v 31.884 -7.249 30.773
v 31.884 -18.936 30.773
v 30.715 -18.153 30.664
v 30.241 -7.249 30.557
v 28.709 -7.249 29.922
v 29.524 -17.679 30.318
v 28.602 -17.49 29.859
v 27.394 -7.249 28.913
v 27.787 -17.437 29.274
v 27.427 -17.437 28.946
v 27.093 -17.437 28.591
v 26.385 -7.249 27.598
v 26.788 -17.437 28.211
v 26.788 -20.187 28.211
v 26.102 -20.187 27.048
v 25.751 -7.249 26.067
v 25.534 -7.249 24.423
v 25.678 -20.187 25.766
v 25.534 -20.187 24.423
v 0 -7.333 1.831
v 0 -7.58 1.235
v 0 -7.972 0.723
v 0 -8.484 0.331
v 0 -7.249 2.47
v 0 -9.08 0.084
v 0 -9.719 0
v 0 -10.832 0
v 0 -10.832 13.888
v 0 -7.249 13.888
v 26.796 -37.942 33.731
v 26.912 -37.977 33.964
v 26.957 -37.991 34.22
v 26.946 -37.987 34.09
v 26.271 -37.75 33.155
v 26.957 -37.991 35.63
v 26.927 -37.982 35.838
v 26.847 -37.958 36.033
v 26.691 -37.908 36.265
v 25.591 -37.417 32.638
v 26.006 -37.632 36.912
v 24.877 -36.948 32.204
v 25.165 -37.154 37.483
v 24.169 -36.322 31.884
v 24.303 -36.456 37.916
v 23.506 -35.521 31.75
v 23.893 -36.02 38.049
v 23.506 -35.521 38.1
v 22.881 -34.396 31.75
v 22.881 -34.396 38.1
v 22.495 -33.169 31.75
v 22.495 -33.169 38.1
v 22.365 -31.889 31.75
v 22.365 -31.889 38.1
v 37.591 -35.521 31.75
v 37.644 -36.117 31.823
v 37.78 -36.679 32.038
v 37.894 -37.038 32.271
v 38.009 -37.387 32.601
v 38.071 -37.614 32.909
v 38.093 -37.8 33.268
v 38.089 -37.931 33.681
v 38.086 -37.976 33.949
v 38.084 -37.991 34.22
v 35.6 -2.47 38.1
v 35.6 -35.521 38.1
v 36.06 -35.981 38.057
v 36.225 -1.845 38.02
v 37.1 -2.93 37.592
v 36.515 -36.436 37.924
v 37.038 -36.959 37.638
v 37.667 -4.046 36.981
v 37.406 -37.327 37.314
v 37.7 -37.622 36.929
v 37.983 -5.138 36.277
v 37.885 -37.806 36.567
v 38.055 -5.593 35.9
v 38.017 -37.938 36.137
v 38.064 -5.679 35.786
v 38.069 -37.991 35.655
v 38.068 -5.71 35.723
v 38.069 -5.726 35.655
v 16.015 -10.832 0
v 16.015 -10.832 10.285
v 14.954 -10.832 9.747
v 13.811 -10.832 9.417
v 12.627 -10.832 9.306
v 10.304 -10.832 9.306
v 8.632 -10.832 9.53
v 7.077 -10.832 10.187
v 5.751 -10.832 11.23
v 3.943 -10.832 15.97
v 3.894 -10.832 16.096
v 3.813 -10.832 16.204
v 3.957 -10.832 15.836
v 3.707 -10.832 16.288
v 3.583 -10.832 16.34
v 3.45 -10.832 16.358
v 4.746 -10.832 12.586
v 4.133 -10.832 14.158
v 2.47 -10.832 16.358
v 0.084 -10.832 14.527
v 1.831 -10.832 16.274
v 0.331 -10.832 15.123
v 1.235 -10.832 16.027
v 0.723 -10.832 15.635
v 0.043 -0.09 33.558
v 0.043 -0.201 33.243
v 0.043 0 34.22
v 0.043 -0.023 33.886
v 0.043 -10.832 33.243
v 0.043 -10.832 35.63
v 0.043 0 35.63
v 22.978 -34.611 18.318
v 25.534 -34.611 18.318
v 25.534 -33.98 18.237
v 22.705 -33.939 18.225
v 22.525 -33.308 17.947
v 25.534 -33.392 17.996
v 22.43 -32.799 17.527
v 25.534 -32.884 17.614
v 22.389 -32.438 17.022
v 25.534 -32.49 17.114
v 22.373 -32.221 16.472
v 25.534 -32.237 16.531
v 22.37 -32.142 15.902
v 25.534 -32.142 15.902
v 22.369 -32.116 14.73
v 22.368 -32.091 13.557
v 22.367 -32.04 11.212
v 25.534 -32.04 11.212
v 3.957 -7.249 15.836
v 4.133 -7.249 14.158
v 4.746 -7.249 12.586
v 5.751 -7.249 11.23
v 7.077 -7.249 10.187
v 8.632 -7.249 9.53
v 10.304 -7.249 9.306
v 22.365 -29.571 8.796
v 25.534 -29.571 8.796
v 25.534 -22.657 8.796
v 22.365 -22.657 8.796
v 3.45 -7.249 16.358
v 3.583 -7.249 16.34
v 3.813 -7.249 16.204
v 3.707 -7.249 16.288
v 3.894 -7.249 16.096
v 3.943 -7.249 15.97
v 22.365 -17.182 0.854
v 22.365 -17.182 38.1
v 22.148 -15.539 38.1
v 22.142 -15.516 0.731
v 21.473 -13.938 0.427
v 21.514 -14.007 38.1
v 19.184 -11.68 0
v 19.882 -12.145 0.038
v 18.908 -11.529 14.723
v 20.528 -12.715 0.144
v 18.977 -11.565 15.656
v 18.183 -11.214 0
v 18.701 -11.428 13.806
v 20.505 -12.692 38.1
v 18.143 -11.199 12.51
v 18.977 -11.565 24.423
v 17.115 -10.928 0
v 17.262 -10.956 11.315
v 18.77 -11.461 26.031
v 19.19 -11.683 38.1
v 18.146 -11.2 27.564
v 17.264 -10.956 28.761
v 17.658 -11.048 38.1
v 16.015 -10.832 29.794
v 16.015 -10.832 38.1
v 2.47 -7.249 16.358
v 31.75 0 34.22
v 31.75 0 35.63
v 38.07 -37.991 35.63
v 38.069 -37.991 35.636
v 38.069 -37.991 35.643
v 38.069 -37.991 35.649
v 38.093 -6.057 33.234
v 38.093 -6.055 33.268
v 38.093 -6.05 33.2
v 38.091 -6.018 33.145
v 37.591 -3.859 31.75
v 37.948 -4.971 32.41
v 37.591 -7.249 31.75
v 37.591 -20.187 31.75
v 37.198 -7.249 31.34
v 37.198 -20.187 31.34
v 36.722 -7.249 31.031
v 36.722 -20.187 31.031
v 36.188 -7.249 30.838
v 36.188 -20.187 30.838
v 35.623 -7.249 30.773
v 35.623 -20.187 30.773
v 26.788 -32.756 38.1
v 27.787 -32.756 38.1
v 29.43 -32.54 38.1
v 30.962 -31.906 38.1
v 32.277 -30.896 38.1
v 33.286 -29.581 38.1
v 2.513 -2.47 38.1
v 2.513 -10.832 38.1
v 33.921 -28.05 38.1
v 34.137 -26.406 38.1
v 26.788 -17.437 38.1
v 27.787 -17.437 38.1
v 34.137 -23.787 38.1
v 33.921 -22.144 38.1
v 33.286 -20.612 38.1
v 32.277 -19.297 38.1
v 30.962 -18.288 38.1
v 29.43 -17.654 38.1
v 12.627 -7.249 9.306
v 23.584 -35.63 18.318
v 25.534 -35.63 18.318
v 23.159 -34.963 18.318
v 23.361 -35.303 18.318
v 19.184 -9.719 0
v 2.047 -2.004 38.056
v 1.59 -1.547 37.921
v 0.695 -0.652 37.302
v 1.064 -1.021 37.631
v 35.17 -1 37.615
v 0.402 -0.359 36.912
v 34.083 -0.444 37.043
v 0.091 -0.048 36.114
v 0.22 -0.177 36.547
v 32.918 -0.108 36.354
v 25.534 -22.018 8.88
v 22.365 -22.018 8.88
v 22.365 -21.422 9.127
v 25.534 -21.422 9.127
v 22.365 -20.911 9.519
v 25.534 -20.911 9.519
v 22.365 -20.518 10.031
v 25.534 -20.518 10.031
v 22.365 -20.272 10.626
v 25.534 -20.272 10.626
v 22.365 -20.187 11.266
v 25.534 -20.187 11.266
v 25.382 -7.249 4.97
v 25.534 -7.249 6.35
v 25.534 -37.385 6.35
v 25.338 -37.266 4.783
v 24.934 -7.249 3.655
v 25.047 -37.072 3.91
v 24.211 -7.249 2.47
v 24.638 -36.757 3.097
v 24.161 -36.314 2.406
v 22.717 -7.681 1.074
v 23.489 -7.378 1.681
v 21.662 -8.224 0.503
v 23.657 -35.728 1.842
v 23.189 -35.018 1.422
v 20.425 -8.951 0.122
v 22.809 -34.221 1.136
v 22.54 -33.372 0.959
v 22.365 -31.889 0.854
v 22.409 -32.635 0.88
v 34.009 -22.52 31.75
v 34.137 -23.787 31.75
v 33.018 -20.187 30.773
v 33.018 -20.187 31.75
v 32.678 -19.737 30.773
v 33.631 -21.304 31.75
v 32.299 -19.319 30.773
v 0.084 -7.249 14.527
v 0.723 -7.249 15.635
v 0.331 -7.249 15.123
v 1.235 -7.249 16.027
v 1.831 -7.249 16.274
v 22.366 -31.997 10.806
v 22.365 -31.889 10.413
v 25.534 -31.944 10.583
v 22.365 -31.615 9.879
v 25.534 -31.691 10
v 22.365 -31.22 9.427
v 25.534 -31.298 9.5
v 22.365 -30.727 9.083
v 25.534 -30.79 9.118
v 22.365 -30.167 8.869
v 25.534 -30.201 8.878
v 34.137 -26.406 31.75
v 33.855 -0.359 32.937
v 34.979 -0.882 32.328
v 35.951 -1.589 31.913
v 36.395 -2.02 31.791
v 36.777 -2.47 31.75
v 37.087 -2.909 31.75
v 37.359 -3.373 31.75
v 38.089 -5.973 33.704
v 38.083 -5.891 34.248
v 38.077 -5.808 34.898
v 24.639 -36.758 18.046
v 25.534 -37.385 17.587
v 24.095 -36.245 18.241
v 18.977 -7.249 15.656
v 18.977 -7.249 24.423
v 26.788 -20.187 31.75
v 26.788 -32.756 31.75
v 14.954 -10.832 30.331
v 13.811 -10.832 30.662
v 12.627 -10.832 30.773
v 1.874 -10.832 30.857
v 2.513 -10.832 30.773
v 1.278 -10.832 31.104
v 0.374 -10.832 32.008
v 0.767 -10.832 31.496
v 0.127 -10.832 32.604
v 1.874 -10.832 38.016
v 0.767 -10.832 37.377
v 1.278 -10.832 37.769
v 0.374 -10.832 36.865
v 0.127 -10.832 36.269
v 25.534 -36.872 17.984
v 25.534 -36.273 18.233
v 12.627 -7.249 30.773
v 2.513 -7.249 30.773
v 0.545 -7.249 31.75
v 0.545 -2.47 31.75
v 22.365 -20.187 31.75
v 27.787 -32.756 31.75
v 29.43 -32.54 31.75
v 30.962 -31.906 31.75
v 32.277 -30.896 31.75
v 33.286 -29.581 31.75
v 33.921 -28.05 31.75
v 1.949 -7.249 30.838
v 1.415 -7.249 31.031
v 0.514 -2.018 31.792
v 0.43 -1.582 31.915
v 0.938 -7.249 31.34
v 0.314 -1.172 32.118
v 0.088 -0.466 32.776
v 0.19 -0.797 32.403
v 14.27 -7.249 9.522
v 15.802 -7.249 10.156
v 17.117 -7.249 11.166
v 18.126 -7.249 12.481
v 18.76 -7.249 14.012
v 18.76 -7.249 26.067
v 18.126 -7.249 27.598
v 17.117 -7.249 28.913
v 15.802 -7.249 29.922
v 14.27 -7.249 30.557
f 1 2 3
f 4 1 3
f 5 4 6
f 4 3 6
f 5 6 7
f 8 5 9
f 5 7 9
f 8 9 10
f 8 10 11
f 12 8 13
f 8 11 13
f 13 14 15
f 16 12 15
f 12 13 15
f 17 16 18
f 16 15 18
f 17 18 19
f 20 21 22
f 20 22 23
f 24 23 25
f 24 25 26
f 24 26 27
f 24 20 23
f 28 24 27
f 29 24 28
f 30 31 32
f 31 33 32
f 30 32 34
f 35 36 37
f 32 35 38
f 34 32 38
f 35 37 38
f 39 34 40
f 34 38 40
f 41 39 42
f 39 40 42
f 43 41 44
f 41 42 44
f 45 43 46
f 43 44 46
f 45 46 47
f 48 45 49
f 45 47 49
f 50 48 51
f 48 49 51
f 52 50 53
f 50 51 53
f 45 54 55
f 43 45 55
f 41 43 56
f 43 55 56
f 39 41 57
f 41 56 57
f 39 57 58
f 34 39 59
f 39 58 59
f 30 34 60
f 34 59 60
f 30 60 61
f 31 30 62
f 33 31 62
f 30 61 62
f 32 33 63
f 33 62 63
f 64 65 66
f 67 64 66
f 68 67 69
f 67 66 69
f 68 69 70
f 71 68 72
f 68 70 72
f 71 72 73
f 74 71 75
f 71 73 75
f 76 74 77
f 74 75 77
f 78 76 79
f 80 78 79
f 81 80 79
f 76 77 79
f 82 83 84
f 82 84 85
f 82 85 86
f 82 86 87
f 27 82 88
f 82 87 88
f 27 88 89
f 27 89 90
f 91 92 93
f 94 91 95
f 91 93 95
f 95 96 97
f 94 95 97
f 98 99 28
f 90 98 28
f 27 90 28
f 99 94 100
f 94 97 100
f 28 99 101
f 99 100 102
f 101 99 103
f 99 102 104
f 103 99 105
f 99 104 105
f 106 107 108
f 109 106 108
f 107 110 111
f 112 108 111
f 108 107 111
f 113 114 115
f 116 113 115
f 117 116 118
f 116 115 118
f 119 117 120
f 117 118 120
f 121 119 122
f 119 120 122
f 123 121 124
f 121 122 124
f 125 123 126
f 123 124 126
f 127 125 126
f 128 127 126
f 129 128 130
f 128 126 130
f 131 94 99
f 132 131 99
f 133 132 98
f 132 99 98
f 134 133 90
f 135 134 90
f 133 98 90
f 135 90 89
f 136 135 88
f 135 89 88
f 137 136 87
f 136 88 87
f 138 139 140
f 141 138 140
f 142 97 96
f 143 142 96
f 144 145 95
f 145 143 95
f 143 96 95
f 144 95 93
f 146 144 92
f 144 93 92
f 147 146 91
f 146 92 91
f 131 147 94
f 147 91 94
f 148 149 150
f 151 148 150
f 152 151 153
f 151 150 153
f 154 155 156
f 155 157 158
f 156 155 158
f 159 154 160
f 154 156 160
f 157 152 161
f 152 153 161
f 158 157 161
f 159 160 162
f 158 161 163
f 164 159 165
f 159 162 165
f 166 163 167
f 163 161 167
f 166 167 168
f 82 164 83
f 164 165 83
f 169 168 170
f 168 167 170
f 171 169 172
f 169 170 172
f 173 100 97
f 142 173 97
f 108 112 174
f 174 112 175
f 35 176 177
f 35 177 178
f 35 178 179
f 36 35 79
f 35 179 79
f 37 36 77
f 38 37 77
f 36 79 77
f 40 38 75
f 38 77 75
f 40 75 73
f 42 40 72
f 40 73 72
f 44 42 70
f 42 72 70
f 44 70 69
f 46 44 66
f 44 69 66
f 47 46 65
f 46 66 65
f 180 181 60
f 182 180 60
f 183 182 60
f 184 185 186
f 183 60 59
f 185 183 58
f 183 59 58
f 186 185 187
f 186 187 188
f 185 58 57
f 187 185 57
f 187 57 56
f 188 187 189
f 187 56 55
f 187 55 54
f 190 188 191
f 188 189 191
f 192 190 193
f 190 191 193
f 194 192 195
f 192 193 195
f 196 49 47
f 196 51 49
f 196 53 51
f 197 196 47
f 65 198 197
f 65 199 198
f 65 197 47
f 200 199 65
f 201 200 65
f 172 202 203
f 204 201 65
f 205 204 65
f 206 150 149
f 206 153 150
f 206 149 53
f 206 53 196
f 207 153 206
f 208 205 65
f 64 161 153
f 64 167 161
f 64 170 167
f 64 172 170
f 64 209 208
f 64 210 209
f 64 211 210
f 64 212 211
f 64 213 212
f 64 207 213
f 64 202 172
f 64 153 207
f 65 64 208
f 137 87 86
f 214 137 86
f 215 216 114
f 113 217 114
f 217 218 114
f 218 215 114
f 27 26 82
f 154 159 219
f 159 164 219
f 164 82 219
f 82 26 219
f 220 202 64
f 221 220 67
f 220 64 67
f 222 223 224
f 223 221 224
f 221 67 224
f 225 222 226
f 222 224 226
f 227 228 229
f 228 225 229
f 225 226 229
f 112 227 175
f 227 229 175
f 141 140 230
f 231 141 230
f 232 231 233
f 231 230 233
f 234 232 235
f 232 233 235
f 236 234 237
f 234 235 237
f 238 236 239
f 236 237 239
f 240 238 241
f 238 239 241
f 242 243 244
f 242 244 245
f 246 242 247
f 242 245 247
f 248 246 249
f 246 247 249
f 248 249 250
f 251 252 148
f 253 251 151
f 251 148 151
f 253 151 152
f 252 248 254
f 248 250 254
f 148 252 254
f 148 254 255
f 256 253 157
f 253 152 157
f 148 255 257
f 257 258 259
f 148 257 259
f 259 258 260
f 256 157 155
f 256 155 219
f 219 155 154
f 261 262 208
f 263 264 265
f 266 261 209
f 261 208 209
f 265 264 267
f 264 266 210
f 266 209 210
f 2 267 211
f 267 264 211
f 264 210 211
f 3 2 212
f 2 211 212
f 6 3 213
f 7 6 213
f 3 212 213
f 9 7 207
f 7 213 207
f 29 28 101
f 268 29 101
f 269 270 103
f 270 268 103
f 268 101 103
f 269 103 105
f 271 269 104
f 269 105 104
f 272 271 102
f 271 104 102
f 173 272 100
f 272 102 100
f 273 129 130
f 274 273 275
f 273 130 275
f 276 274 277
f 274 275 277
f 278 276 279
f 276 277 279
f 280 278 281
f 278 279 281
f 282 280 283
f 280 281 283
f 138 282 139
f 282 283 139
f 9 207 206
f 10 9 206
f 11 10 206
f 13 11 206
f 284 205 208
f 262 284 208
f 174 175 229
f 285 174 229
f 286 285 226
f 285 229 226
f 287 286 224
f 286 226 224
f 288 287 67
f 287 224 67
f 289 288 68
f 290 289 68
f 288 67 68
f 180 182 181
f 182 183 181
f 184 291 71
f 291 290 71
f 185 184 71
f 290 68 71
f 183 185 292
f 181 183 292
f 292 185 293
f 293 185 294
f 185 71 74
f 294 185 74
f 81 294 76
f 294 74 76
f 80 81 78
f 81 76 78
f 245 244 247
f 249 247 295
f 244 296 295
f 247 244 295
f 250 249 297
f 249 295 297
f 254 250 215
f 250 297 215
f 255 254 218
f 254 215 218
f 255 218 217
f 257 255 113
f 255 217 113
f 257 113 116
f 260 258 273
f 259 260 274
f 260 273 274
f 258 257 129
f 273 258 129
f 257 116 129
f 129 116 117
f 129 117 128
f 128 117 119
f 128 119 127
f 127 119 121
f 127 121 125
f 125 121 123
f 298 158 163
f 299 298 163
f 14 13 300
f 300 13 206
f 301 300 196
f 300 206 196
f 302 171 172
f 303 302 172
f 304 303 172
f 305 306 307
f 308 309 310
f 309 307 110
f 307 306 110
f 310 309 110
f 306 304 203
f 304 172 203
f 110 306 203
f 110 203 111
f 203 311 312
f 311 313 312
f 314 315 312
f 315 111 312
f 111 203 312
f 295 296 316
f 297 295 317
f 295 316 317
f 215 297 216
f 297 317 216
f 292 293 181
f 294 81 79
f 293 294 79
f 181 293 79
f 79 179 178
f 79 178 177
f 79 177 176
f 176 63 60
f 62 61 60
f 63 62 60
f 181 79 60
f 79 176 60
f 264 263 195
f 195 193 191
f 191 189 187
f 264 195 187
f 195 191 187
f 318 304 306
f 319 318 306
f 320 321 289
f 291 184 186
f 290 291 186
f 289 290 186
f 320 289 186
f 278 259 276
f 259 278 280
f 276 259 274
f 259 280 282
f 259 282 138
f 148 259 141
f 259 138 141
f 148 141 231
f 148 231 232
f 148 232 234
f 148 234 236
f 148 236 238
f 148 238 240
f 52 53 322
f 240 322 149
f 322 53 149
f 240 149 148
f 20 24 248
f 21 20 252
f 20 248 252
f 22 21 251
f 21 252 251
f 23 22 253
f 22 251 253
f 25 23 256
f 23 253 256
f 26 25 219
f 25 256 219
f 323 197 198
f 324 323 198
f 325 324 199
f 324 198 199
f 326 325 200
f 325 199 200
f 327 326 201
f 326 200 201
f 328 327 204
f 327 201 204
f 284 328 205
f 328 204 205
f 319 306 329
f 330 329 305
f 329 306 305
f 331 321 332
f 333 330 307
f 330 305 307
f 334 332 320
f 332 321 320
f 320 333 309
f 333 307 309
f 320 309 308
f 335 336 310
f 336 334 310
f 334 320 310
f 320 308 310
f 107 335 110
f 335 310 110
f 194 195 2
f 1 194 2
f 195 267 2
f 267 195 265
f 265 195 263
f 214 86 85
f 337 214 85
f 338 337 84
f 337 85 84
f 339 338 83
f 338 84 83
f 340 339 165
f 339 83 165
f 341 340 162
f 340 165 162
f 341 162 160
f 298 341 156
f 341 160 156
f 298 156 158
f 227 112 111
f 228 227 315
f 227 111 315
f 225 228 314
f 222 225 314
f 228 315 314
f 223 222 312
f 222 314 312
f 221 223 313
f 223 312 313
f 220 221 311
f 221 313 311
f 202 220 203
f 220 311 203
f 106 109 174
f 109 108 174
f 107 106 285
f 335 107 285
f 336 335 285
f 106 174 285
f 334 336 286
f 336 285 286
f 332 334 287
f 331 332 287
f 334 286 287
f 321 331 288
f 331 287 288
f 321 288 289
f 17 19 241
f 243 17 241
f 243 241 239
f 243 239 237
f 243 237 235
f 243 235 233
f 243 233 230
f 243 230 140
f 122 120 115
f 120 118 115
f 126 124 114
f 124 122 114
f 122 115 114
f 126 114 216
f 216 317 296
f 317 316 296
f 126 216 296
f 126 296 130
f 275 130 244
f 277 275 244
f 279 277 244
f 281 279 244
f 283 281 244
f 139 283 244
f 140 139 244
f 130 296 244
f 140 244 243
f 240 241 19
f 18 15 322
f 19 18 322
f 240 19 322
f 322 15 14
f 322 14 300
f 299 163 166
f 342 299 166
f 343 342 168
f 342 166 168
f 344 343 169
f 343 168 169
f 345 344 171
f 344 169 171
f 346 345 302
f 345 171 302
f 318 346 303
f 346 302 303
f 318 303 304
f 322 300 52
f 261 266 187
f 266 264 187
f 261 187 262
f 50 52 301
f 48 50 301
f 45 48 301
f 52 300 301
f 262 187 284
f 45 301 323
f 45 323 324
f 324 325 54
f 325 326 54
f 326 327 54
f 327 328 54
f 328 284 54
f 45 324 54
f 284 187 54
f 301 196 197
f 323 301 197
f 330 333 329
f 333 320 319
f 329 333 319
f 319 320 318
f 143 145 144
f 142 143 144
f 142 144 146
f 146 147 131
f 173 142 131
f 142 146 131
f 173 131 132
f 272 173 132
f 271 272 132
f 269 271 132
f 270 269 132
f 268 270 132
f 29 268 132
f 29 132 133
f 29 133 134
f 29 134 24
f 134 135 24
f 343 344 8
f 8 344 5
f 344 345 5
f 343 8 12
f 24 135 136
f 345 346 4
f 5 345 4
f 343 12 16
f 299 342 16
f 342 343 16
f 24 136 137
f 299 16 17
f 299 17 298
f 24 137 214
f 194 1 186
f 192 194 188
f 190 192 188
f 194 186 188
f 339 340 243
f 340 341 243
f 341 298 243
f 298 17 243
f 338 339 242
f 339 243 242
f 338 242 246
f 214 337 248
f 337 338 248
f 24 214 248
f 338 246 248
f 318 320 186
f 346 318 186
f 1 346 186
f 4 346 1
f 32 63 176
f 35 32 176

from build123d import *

# Parameters (mm, degrees)
F0_W      = 38.1
F0_H      = 38.1
F1_DEPTH  = 38.1
F7_DEPTH  = 38.1
F8_DEPTH  = 38.1
F10_DEPTH = 38.1


with BuildPart() as f1:
    # F0 (on Front) → F1 (new body)
    with BuildSketch(Plane.XZ):
        with Locations((19.05, 19.05)):
            Rectangle(F0_W, F0_H)
    extrude(amount=F1_DEPTH)

    # F6 (on offset) → F7 (cut)
    with BuildSketch(Plane.YZ.offset(38.1)):
        with BuildLine():
            Line((-20.187413, 31.75), (-29.192599, 31.75))
            Line((-29.192599, 31.75), (-35.52093, 31.75))
            ThreePointArc((-35.52093, 31.75), (-37.267369, 32.473399), (-37.990768, 34.219837))
            Line((-37.990768, 34.219837), (-37.990768, 35.630163))
            ThreePointArc((-37.990768, 35.630163), (-37.267369, 37.376601), (-35.52093, 38.1))
            Line((-35.52093, 38.1), (-38.1, 38.1))
            Line((-38.1, 38.1), (-38.1, 15.848642))
            ThreePointArc((-38.1, 15.848642), (-37.376601, 17.595081), (-35.630163, 18.31848))
            Line((-35.630163, 18.31848), (-34.611057, 18.31848))
            ThreePointArc((-34.611057, 18.31848), (-32.883701, 17.613958), (-32.141803, 15.902322))
            Line((-32.141803, 15.902322), (-32.039838, 11.211913))
            ThreePointArc((-32.039838, 11.211913), (-31.29794, 9.500277), (-29.570584, 8.795755))
            Line((-29.570584, 8.795755), (-22.657251, 8.795755))
            ThreePointArc((-22.657251, 8.795755), (-20.910812, 9.519154), (-20.187413, 11.265592))
            Line((-20.187413, 11.265592), (-20.187413, 31.75))
        make_face()
        with BuildLine():
            Line((0, 0), (0, 34.219837))
            ThreePointArc((0, 34.219837), (-0.723399, 32.473399), (-2.469837, 31.75))
            Line((-2.469837, 31.75), (-7.248927, 31.75))
            Line((-7.248927, 31.75), (-7.248927, 2.469837))
            ThreePointArc((-7.248927, 2.469837), (-7.972326, 0.723399), (-9.718765, 0))
            Line((-9.718765, 0), (0, 0))
        make_face()
        with BuildLine():
            Line((0, 38.1), (-2.469837, 38.1))
            ThreePointArc((-2.469837, 38.1), (-0.723399, 37.376601), (0, 35.630163))
            Line((0, 35.630163), (0, 38.1))
        make_face()
        with BuildLine():
            ThreePointArc((-35.630163, 0), (-37.376601, 0.723399), (-38.1, 2.469837))
            Line((-38.1, 2.469837), (-38.1, 0))
            Line((-38.1, 0), (-35.630163, 0))
        make_face()
    extrude(amount=-F7_DEPTH, mode=Mode.SUBTRACT)

    # F5 (on offset) → F8 (cut)
    with BuildSketch(Plane.XZ.offset(38.1)):
        with BuildLine():
            Line((0, 38.1), (0, 13.888076))
            ThreePointArc((0, 13.888076), (0.723399, 15.634515), (2.469837, 16.357914))
            Line((2.469837, 16.357914), (3.4497, 16.357914))
            ThreePointArc((3.4497, 16.357914), (3.813439, 16.20421), (3.95674, 15.83625))
            ThreePointArc((3.95674, 15.83625), (5.750677, 11.229898), (10.304174, 9.30575))
            Line((10.304174, 9.30575), (11.1735, 9.30575))
            Line((11.1735, 9.30575), (12.626726, 9.30575))
            ThreePointArc((12.626726, 9.30575), (17.116854, 11.165622), (18.976726, 15.65575))
            Line((18.976726, 15.65575), (18.976726, 24.423077))
            ThreePointArc((18.976726, 24.423077), (17.116854, 28.913205), (12.626726, 30.773077))
            Line((12.626726, 30.773077), (12.052785, 30.773077))
            Line((12.052785, 30.773077), (2.512986, 30.773077))
            ThreePointArc((2.512986, 30.773077), (0.766547, 31.496476), (0.043148, 33.242915))
            Line((0.043148, 33.242915), (0.043148, 35.630163))
            ThreePointArc((0.043148, 35.630163), (0.766547, 37.376601), (2.512986, 38.1))
            Line((2.512986, 38.1), (0, 38.1))
        make_face()
        with BuildLine():
            ThreePointArc((25.53427, 6.35), (23.674398, 1.859872), (19.18427, 0))
            Line((19.18427, 0), (38.1, 0))
            Line((38.1, 0), (38.1, 38.1))
            Line((38.1, 38.1), (35.599574, 38.1))
            ThreePointArc((35.599574, 38.1), (37.337263, 37.385307), (38.069288, 35.654848))
            Line((38.069288, 35.654848), (38.093149, 33.2676))
            ThreePointArc((38.093149, 33.2676), (37.37858, 31.505225), (35.623435, 30.773077))
            Line((35.623435, 30.773077), (31.88427, 30.773077))
            ThreePointArc((31.88427, 30.773077), (27.394142, 28.913205), (25.53427, 24.423077))
            Line((25.53427, 24.423077), (25.53427, 6.35))
        make_face()
    extrude(amount=-F8_DEPTH, mode=Mode.SUBTRACT)

    # F9 (on offset) → F10 (cut)
    with BuildSketch(Plane.XY.offset(38.1)):
        with BuildLine():
            Line((27.78691, -17.437199), (26.787849, -17.437199))
            Line((26.787849, -17.437199), (26.787849, -32.756366))
            Line((26.787849, -32.756366), (27.78691, -32.756366))
            ThreePointArc((27.78691, -32.756366), (32.277038, -30.896494), (34.13691, -26.406366))
            Line((34.13691, -26.406366), (34.13691, -23.787199))
            ThreePointArc((34.13691, -23.787199), (32.277038, -19.297071), (27.78691, -17.437199))
        make_face()
        with BuildLine():
            Line((38.1, 0), (31.75, 0))
            ThreePointArc((31.75, 0), (36.240128, -1.859872), (38.1, -6.35))
            Line((38.1, -6.35), (38.1, 0))
        make_face()
        with BuildLine():
            Line((16.014762, -10.832123), (0, -10.832123))
            Line((0, -10.832123), (0, -38.23876))
            Line((0, -38.23876), (0.831124, -38.23876))
            Line((0.831124, -38.23876), (28.714762, -38.23876))
            ThreePointArc((28.714762, -38.23876), (24.224634, -36.378888), (22.364762, -31.88876))
            Line((22.364762, -31.88876), (22.364762, -31.69275))
            Line((22.364762, -31.69275), (22.364762, -17.182123))
            ThreePointArc((22.364762, -17.182123), (20.50489, -12.691995), (16.014762, -10.832123))
        make_face()
    extrude(amount=-F10_DEPTH, mode=Mode.SUBTRACT)


solid = f1.part
